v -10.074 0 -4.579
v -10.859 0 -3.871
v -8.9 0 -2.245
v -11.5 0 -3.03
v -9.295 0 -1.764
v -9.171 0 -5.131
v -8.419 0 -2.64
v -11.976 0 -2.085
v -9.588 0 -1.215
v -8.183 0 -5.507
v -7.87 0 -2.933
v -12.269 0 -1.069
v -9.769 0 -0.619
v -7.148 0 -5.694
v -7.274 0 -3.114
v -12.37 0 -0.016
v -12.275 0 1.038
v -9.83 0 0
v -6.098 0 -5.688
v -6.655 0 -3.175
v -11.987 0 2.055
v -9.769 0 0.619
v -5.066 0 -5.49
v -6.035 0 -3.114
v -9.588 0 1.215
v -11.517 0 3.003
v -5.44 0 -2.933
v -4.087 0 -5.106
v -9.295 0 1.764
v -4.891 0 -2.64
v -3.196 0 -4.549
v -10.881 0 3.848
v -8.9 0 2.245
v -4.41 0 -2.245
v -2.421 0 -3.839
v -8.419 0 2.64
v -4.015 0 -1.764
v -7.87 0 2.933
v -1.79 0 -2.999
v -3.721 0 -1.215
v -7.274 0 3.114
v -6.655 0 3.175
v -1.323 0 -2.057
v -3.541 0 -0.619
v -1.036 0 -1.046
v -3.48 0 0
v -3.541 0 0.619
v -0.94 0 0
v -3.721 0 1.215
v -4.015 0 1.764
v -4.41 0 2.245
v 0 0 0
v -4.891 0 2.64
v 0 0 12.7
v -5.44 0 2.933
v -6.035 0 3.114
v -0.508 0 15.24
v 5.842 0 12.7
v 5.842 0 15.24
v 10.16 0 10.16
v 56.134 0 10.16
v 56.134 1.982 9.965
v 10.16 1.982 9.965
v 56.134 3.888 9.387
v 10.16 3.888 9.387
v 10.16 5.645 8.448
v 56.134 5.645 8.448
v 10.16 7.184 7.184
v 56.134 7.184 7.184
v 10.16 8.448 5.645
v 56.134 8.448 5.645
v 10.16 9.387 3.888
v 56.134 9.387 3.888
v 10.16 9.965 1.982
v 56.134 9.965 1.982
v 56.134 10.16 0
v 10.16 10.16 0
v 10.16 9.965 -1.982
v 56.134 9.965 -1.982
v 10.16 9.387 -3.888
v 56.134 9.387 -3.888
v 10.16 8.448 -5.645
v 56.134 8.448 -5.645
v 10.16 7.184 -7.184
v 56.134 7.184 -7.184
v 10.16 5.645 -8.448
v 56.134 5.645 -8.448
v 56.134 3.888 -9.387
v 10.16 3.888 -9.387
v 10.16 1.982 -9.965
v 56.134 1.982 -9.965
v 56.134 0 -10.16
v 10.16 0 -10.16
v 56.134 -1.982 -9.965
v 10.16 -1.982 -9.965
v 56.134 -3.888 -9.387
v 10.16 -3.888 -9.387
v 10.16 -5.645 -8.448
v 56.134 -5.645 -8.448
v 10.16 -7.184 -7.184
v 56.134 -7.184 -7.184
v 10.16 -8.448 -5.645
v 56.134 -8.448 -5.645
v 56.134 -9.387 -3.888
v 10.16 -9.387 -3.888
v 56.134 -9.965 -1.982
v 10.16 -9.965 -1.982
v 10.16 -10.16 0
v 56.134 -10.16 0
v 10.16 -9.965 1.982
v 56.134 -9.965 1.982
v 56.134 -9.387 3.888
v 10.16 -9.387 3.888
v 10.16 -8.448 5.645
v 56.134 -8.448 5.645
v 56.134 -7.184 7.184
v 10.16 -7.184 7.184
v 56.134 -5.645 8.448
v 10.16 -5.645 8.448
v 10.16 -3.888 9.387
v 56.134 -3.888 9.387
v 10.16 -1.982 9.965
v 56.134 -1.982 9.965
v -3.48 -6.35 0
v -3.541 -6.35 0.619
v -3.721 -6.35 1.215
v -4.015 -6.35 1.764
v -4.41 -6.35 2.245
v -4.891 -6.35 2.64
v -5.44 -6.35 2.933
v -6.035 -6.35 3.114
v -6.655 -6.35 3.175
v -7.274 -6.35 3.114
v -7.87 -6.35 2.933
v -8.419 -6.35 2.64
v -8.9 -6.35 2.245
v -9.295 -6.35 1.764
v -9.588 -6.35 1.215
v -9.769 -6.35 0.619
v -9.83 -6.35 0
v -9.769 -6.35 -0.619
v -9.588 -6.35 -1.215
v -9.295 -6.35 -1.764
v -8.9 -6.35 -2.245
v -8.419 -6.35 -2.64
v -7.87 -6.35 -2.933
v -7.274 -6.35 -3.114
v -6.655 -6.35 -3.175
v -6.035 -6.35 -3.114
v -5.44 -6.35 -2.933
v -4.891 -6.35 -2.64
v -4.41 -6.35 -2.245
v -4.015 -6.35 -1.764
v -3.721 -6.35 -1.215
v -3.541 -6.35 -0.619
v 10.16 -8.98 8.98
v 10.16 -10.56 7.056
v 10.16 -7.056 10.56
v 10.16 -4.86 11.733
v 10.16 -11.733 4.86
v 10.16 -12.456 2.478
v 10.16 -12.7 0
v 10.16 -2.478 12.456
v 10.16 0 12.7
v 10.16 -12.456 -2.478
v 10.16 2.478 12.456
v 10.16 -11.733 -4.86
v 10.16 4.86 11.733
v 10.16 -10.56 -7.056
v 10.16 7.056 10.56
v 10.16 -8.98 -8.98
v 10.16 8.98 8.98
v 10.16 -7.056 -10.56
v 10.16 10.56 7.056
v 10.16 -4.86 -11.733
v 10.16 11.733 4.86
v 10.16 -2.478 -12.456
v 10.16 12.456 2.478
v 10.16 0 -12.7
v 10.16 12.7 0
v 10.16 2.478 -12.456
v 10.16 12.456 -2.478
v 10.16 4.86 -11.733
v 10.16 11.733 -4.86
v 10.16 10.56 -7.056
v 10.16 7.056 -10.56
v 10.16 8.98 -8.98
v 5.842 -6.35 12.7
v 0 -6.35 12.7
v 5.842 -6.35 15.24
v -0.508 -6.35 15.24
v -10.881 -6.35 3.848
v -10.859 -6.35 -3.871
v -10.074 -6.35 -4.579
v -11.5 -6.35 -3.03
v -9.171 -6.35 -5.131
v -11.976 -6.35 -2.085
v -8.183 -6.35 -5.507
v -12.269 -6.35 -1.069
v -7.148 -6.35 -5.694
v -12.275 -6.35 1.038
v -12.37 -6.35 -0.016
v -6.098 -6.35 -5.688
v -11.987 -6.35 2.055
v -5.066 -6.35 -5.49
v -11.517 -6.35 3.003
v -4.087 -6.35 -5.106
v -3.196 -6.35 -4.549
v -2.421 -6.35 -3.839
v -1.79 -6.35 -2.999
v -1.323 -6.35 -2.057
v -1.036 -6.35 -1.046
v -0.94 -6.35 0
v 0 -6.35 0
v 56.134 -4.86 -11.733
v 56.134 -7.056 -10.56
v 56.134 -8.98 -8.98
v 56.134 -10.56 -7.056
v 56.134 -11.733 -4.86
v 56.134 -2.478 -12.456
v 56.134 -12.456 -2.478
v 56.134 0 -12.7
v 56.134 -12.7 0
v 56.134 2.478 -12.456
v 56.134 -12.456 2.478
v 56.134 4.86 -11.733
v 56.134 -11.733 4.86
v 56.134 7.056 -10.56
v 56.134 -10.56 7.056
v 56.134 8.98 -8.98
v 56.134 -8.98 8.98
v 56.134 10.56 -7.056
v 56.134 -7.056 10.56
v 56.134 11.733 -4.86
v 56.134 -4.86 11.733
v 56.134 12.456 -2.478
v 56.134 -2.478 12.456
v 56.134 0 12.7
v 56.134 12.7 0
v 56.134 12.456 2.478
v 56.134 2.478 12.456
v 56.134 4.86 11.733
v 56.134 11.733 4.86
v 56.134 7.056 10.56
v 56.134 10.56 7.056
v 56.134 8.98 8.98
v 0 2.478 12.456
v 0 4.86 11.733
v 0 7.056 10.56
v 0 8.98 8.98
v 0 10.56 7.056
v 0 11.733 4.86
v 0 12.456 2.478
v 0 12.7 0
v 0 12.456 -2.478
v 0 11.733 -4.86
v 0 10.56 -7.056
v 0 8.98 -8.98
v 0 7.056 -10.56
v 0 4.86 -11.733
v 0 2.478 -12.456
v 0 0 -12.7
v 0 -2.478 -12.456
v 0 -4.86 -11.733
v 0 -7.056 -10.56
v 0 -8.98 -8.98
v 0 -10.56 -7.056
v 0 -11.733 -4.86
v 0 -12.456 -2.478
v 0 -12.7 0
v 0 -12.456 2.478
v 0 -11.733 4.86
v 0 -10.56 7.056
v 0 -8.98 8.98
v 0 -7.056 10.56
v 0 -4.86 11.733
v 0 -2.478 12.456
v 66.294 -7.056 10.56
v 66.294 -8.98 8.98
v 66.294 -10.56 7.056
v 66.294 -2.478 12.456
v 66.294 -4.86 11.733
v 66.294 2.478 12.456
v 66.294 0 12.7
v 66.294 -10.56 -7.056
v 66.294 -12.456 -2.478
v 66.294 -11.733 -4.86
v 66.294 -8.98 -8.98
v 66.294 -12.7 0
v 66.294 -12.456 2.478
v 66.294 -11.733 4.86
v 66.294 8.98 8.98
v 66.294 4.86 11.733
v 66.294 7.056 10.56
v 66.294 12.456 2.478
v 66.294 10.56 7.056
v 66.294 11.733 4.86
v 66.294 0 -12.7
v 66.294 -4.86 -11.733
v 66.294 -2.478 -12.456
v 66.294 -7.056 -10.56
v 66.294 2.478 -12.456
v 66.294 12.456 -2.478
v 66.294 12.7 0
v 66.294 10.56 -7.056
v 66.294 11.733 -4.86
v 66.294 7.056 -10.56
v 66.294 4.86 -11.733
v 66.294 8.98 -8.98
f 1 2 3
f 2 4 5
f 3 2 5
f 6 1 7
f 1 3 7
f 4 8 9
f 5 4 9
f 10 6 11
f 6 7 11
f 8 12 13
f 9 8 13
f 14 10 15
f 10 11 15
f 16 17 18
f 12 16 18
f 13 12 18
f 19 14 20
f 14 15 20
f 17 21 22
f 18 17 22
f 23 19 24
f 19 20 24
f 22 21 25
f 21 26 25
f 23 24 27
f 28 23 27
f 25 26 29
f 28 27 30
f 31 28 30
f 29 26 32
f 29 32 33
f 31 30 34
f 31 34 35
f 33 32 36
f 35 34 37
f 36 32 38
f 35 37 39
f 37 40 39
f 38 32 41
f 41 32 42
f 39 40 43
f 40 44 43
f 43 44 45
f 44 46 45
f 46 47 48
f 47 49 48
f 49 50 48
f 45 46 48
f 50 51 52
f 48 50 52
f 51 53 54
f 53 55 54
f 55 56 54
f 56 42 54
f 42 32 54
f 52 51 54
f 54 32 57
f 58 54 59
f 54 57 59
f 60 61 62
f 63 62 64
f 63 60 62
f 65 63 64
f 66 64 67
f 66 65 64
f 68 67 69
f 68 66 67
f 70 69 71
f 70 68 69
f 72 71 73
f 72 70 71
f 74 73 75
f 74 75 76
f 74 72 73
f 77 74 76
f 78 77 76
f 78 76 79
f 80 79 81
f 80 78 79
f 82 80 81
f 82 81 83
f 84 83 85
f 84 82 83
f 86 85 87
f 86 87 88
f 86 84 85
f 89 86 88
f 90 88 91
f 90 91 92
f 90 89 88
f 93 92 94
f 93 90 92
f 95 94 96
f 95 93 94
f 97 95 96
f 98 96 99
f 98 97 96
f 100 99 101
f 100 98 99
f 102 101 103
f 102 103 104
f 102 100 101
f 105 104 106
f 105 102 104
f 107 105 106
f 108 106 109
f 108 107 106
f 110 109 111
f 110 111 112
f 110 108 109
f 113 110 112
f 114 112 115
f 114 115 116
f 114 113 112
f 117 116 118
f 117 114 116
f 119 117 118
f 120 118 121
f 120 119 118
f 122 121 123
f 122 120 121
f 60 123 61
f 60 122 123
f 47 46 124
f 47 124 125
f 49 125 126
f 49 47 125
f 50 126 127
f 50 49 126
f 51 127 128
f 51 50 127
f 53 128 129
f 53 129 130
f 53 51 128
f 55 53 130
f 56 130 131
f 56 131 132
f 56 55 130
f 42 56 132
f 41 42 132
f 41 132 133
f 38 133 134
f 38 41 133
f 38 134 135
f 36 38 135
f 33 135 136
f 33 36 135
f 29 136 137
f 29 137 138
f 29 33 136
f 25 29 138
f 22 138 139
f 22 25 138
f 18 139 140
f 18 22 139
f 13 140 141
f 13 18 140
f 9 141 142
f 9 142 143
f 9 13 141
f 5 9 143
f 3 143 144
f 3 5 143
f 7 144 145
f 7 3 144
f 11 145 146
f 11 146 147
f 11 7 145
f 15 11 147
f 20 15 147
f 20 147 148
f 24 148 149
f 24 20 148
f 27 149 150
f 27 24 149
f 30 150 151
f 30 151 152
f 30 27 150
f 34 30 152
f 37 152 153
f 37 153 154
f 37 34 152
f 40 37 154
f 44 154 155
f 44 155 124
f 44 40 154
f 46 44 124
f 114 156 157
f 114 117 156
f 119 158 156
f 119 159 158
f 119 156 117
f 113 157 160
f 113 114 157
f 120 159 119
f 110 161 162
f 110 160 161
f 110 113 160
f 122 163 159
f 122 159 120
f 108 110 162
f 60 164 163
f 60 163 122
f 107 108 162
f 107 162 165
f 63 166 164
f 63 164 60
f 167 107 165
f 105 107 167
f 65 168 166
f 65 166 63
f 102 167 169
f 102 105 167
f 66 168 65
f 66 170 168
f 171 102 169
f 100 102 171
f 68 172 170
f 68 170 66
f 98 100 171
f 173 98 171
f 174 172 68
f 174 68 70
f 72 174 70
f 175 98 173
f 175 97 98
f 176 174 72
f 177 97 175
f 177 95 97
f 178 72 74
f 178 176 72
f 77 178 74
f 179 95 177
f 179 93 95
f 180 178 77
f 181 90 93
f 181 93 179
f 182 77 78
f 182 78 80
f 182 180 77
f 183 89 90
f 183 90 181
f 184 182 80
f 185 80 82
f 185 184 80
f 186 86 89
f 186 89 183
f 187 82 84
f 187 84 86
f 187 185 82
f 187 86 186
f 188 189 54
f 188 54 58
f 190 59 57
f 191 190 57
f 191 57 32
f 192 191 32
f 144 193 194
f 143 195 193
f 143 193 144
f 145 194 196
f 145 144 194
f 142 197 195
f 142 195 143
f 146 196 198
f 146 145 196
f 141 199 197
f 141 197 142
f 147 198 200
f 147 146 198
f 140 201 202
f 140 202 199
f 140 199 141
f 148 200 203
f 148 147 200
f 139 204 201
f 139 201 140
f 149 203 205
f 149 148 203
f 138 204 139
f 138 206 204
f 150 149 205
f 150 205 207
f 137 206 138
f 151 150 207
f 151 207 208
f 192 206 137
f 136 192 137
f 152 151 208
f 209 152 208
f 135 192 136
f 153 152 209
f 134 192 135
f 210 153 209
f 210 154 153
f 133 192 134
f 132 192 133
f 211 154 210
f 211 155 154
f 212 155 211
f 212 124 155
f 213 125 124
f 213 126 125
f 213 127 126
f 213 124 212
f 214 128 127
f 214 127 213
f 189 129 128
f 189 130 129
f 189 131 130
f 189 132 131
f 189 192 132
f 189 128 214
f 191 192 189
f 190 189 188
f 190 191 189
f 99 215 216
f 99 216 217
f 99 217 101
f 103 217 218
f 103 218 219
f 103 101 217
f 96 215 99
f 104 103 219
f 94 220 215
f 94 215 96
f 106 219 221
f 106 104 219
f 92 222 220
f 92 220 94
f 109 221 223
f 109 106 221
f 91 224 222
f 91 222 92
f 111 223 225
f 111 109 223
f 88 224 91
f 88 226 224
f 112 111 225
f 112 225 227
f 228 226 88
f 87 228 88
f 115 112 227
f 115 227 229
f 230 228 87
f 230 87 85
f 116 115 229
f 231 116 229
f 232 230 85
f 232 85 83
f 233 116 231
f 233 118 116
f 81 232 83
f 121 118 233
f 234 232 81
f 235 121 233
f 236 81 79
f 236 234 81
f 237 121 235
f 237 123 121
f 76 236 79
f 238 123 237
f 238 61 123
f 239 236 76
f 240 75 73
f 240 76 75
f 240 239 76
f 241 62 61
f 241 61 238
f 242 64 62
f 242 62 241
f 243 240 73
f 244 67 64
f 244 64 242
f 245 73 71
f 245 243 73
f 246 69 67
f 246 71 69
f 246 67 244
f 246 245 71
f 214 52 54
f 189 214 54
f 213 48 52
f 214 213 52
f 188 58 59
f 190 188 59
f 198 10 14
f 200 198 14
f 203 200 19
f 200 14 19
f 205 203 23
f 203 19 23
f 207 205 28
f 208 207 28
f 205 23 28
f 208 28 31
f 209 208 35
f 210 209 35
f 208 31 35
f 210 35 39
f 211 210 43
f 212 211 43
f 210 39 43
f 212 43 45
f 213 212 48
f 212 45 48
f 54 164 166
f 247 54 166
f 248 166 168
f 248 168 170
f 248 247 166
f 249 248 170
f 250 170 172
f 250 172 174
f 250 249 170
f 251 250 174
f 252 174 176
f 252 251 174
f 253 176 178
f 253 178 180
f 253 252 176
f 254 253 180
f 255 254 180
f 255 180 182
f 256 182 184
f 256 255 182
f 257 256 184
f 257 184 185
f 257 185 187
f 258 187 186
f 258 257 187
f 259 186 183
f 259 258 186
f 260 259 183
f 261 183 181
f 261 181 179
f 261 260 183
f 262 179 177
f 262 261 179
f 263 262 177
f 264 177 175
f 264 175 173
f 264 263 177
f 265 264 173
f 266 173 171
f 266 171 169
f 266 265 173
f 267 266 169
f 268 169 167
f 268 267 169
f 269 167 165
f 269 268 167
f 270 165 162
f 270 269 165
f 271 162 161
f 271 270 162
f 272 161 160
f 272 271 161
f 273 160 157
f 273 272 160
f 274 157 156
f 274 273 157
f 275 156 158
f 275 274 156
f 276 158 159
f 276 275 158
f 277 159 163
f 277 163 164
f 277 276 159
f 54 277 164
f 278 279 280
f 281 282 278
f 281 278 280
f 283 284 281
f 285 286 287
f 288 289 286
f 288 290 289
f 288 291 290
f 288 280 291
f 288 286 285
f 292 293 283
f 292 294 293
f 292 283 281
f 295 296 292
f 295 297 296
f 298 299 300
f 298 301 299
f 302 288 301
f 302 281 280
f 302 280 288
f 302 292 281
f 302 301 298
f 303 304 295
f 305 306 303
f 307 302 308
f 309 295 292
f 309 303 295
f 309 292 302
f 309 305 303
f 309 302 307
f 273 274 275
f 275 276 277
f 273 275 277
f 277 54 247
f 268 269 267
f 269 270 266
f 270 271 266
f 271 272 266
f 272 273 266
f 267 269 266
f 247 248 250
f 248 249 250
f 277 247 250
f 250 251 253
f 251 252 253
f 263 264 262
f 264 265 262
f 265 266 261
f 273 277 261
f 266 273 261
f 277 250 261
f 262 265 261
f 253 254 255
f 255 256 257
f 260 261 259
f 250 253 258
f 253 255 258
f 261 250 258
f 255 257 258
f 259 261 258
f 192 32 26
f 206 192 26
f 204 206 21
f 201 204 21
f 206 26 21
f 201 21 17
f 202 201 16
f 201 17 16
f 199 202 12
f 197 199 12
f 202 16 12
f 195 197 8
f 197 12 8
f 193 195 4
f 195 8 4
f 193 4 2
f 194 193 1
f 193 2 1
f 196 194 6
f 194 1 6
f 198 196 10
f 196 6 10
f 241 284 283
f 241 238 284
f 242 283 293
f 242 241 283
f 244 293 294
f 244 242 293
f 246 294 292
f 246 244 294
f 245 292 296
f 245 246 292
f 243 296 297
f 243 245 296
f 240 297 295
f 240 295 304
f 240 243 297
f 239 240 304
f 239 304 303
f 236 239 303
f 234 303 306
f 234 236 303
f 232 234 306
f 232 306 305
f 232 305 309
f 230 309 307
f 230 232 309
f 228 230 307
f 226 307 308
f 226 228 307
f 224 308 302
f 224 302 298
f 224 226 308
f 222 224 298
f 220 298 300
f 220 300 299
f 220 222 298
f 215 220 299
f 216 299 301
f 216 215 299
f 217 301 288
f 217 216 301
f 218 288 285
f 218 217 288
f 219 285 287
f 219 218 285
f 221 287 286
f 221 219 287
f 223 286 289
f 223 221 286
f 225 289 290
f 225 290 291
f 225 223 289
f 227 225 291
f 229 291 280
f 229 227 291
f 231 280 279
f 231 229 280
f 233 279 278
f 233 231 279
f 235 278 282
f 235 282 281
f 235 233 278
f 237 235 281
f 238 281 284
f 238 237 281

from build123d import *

# Parameters (mm, degrees)
F0_W     = 5.842
F0_H     = 12.7
F0_R     = 3.175
F2_DEPTH = 6.35


with BuildPart() as f1:
    # F0 (on Front) → F1 (revolve)
    with BuildSketch(Plane.XZ):
        Polygon((5.842, 12.7), (5.842, 0), (66.294, 0), (66.294, 12.7), (56.134, 12.7), (56.134, 10.16), (10.16, 10.16), (10.16, 12.7), align=None)
        with Locations((2.921, 6.35)):
            Rectangle(F0_W, F0_H)
    revolve(axis=Axis((33.147, 0, 0), (-1, 0, 0)))


with BuildPart() as f2:
    # F0 (on Front) → F2 (new body)
    with BuildSketch(Plane.XZ):
        with BuildLine():
            Line((-0.9398, 0), (0, 0))
            Line((0, 0), (0, 12.7))
            Line((0, 12.7), (5.842, 12.7))
            Line((5.842, 12.7), (5.842, 15.24))
            Line((5.842, 15.24), (-0.508, 15.24))
            Line((-0.508, 15.24), (-10.88063, 3.847543))
            ThreePointArc((-10.88063, 3.847543), (-4.591961, 5.329721), (-0.9398, 0))
        make_face()
        with BuildLine():
            ThreePointArc((-8.182663, -5.506983), (-3.195791, -4.549339), (-0.9398, 0))
            ThreePointArc((-0.9398, 0), (-4.591961, 5.329721), (-10.88063, 3.847543))
            ThreePointArc((-10.88063, 3.847543), (-12.145978, -1.583727), (-8.182663, -5.506983))
        make_face()
        with Locations((-6.6548, 0)):
            Circle(F0_R, mode=Mode.SUBTRACT)
    extrude(amount=F2_DEPTH)


solid = Compound([f1.part, f2.part])
